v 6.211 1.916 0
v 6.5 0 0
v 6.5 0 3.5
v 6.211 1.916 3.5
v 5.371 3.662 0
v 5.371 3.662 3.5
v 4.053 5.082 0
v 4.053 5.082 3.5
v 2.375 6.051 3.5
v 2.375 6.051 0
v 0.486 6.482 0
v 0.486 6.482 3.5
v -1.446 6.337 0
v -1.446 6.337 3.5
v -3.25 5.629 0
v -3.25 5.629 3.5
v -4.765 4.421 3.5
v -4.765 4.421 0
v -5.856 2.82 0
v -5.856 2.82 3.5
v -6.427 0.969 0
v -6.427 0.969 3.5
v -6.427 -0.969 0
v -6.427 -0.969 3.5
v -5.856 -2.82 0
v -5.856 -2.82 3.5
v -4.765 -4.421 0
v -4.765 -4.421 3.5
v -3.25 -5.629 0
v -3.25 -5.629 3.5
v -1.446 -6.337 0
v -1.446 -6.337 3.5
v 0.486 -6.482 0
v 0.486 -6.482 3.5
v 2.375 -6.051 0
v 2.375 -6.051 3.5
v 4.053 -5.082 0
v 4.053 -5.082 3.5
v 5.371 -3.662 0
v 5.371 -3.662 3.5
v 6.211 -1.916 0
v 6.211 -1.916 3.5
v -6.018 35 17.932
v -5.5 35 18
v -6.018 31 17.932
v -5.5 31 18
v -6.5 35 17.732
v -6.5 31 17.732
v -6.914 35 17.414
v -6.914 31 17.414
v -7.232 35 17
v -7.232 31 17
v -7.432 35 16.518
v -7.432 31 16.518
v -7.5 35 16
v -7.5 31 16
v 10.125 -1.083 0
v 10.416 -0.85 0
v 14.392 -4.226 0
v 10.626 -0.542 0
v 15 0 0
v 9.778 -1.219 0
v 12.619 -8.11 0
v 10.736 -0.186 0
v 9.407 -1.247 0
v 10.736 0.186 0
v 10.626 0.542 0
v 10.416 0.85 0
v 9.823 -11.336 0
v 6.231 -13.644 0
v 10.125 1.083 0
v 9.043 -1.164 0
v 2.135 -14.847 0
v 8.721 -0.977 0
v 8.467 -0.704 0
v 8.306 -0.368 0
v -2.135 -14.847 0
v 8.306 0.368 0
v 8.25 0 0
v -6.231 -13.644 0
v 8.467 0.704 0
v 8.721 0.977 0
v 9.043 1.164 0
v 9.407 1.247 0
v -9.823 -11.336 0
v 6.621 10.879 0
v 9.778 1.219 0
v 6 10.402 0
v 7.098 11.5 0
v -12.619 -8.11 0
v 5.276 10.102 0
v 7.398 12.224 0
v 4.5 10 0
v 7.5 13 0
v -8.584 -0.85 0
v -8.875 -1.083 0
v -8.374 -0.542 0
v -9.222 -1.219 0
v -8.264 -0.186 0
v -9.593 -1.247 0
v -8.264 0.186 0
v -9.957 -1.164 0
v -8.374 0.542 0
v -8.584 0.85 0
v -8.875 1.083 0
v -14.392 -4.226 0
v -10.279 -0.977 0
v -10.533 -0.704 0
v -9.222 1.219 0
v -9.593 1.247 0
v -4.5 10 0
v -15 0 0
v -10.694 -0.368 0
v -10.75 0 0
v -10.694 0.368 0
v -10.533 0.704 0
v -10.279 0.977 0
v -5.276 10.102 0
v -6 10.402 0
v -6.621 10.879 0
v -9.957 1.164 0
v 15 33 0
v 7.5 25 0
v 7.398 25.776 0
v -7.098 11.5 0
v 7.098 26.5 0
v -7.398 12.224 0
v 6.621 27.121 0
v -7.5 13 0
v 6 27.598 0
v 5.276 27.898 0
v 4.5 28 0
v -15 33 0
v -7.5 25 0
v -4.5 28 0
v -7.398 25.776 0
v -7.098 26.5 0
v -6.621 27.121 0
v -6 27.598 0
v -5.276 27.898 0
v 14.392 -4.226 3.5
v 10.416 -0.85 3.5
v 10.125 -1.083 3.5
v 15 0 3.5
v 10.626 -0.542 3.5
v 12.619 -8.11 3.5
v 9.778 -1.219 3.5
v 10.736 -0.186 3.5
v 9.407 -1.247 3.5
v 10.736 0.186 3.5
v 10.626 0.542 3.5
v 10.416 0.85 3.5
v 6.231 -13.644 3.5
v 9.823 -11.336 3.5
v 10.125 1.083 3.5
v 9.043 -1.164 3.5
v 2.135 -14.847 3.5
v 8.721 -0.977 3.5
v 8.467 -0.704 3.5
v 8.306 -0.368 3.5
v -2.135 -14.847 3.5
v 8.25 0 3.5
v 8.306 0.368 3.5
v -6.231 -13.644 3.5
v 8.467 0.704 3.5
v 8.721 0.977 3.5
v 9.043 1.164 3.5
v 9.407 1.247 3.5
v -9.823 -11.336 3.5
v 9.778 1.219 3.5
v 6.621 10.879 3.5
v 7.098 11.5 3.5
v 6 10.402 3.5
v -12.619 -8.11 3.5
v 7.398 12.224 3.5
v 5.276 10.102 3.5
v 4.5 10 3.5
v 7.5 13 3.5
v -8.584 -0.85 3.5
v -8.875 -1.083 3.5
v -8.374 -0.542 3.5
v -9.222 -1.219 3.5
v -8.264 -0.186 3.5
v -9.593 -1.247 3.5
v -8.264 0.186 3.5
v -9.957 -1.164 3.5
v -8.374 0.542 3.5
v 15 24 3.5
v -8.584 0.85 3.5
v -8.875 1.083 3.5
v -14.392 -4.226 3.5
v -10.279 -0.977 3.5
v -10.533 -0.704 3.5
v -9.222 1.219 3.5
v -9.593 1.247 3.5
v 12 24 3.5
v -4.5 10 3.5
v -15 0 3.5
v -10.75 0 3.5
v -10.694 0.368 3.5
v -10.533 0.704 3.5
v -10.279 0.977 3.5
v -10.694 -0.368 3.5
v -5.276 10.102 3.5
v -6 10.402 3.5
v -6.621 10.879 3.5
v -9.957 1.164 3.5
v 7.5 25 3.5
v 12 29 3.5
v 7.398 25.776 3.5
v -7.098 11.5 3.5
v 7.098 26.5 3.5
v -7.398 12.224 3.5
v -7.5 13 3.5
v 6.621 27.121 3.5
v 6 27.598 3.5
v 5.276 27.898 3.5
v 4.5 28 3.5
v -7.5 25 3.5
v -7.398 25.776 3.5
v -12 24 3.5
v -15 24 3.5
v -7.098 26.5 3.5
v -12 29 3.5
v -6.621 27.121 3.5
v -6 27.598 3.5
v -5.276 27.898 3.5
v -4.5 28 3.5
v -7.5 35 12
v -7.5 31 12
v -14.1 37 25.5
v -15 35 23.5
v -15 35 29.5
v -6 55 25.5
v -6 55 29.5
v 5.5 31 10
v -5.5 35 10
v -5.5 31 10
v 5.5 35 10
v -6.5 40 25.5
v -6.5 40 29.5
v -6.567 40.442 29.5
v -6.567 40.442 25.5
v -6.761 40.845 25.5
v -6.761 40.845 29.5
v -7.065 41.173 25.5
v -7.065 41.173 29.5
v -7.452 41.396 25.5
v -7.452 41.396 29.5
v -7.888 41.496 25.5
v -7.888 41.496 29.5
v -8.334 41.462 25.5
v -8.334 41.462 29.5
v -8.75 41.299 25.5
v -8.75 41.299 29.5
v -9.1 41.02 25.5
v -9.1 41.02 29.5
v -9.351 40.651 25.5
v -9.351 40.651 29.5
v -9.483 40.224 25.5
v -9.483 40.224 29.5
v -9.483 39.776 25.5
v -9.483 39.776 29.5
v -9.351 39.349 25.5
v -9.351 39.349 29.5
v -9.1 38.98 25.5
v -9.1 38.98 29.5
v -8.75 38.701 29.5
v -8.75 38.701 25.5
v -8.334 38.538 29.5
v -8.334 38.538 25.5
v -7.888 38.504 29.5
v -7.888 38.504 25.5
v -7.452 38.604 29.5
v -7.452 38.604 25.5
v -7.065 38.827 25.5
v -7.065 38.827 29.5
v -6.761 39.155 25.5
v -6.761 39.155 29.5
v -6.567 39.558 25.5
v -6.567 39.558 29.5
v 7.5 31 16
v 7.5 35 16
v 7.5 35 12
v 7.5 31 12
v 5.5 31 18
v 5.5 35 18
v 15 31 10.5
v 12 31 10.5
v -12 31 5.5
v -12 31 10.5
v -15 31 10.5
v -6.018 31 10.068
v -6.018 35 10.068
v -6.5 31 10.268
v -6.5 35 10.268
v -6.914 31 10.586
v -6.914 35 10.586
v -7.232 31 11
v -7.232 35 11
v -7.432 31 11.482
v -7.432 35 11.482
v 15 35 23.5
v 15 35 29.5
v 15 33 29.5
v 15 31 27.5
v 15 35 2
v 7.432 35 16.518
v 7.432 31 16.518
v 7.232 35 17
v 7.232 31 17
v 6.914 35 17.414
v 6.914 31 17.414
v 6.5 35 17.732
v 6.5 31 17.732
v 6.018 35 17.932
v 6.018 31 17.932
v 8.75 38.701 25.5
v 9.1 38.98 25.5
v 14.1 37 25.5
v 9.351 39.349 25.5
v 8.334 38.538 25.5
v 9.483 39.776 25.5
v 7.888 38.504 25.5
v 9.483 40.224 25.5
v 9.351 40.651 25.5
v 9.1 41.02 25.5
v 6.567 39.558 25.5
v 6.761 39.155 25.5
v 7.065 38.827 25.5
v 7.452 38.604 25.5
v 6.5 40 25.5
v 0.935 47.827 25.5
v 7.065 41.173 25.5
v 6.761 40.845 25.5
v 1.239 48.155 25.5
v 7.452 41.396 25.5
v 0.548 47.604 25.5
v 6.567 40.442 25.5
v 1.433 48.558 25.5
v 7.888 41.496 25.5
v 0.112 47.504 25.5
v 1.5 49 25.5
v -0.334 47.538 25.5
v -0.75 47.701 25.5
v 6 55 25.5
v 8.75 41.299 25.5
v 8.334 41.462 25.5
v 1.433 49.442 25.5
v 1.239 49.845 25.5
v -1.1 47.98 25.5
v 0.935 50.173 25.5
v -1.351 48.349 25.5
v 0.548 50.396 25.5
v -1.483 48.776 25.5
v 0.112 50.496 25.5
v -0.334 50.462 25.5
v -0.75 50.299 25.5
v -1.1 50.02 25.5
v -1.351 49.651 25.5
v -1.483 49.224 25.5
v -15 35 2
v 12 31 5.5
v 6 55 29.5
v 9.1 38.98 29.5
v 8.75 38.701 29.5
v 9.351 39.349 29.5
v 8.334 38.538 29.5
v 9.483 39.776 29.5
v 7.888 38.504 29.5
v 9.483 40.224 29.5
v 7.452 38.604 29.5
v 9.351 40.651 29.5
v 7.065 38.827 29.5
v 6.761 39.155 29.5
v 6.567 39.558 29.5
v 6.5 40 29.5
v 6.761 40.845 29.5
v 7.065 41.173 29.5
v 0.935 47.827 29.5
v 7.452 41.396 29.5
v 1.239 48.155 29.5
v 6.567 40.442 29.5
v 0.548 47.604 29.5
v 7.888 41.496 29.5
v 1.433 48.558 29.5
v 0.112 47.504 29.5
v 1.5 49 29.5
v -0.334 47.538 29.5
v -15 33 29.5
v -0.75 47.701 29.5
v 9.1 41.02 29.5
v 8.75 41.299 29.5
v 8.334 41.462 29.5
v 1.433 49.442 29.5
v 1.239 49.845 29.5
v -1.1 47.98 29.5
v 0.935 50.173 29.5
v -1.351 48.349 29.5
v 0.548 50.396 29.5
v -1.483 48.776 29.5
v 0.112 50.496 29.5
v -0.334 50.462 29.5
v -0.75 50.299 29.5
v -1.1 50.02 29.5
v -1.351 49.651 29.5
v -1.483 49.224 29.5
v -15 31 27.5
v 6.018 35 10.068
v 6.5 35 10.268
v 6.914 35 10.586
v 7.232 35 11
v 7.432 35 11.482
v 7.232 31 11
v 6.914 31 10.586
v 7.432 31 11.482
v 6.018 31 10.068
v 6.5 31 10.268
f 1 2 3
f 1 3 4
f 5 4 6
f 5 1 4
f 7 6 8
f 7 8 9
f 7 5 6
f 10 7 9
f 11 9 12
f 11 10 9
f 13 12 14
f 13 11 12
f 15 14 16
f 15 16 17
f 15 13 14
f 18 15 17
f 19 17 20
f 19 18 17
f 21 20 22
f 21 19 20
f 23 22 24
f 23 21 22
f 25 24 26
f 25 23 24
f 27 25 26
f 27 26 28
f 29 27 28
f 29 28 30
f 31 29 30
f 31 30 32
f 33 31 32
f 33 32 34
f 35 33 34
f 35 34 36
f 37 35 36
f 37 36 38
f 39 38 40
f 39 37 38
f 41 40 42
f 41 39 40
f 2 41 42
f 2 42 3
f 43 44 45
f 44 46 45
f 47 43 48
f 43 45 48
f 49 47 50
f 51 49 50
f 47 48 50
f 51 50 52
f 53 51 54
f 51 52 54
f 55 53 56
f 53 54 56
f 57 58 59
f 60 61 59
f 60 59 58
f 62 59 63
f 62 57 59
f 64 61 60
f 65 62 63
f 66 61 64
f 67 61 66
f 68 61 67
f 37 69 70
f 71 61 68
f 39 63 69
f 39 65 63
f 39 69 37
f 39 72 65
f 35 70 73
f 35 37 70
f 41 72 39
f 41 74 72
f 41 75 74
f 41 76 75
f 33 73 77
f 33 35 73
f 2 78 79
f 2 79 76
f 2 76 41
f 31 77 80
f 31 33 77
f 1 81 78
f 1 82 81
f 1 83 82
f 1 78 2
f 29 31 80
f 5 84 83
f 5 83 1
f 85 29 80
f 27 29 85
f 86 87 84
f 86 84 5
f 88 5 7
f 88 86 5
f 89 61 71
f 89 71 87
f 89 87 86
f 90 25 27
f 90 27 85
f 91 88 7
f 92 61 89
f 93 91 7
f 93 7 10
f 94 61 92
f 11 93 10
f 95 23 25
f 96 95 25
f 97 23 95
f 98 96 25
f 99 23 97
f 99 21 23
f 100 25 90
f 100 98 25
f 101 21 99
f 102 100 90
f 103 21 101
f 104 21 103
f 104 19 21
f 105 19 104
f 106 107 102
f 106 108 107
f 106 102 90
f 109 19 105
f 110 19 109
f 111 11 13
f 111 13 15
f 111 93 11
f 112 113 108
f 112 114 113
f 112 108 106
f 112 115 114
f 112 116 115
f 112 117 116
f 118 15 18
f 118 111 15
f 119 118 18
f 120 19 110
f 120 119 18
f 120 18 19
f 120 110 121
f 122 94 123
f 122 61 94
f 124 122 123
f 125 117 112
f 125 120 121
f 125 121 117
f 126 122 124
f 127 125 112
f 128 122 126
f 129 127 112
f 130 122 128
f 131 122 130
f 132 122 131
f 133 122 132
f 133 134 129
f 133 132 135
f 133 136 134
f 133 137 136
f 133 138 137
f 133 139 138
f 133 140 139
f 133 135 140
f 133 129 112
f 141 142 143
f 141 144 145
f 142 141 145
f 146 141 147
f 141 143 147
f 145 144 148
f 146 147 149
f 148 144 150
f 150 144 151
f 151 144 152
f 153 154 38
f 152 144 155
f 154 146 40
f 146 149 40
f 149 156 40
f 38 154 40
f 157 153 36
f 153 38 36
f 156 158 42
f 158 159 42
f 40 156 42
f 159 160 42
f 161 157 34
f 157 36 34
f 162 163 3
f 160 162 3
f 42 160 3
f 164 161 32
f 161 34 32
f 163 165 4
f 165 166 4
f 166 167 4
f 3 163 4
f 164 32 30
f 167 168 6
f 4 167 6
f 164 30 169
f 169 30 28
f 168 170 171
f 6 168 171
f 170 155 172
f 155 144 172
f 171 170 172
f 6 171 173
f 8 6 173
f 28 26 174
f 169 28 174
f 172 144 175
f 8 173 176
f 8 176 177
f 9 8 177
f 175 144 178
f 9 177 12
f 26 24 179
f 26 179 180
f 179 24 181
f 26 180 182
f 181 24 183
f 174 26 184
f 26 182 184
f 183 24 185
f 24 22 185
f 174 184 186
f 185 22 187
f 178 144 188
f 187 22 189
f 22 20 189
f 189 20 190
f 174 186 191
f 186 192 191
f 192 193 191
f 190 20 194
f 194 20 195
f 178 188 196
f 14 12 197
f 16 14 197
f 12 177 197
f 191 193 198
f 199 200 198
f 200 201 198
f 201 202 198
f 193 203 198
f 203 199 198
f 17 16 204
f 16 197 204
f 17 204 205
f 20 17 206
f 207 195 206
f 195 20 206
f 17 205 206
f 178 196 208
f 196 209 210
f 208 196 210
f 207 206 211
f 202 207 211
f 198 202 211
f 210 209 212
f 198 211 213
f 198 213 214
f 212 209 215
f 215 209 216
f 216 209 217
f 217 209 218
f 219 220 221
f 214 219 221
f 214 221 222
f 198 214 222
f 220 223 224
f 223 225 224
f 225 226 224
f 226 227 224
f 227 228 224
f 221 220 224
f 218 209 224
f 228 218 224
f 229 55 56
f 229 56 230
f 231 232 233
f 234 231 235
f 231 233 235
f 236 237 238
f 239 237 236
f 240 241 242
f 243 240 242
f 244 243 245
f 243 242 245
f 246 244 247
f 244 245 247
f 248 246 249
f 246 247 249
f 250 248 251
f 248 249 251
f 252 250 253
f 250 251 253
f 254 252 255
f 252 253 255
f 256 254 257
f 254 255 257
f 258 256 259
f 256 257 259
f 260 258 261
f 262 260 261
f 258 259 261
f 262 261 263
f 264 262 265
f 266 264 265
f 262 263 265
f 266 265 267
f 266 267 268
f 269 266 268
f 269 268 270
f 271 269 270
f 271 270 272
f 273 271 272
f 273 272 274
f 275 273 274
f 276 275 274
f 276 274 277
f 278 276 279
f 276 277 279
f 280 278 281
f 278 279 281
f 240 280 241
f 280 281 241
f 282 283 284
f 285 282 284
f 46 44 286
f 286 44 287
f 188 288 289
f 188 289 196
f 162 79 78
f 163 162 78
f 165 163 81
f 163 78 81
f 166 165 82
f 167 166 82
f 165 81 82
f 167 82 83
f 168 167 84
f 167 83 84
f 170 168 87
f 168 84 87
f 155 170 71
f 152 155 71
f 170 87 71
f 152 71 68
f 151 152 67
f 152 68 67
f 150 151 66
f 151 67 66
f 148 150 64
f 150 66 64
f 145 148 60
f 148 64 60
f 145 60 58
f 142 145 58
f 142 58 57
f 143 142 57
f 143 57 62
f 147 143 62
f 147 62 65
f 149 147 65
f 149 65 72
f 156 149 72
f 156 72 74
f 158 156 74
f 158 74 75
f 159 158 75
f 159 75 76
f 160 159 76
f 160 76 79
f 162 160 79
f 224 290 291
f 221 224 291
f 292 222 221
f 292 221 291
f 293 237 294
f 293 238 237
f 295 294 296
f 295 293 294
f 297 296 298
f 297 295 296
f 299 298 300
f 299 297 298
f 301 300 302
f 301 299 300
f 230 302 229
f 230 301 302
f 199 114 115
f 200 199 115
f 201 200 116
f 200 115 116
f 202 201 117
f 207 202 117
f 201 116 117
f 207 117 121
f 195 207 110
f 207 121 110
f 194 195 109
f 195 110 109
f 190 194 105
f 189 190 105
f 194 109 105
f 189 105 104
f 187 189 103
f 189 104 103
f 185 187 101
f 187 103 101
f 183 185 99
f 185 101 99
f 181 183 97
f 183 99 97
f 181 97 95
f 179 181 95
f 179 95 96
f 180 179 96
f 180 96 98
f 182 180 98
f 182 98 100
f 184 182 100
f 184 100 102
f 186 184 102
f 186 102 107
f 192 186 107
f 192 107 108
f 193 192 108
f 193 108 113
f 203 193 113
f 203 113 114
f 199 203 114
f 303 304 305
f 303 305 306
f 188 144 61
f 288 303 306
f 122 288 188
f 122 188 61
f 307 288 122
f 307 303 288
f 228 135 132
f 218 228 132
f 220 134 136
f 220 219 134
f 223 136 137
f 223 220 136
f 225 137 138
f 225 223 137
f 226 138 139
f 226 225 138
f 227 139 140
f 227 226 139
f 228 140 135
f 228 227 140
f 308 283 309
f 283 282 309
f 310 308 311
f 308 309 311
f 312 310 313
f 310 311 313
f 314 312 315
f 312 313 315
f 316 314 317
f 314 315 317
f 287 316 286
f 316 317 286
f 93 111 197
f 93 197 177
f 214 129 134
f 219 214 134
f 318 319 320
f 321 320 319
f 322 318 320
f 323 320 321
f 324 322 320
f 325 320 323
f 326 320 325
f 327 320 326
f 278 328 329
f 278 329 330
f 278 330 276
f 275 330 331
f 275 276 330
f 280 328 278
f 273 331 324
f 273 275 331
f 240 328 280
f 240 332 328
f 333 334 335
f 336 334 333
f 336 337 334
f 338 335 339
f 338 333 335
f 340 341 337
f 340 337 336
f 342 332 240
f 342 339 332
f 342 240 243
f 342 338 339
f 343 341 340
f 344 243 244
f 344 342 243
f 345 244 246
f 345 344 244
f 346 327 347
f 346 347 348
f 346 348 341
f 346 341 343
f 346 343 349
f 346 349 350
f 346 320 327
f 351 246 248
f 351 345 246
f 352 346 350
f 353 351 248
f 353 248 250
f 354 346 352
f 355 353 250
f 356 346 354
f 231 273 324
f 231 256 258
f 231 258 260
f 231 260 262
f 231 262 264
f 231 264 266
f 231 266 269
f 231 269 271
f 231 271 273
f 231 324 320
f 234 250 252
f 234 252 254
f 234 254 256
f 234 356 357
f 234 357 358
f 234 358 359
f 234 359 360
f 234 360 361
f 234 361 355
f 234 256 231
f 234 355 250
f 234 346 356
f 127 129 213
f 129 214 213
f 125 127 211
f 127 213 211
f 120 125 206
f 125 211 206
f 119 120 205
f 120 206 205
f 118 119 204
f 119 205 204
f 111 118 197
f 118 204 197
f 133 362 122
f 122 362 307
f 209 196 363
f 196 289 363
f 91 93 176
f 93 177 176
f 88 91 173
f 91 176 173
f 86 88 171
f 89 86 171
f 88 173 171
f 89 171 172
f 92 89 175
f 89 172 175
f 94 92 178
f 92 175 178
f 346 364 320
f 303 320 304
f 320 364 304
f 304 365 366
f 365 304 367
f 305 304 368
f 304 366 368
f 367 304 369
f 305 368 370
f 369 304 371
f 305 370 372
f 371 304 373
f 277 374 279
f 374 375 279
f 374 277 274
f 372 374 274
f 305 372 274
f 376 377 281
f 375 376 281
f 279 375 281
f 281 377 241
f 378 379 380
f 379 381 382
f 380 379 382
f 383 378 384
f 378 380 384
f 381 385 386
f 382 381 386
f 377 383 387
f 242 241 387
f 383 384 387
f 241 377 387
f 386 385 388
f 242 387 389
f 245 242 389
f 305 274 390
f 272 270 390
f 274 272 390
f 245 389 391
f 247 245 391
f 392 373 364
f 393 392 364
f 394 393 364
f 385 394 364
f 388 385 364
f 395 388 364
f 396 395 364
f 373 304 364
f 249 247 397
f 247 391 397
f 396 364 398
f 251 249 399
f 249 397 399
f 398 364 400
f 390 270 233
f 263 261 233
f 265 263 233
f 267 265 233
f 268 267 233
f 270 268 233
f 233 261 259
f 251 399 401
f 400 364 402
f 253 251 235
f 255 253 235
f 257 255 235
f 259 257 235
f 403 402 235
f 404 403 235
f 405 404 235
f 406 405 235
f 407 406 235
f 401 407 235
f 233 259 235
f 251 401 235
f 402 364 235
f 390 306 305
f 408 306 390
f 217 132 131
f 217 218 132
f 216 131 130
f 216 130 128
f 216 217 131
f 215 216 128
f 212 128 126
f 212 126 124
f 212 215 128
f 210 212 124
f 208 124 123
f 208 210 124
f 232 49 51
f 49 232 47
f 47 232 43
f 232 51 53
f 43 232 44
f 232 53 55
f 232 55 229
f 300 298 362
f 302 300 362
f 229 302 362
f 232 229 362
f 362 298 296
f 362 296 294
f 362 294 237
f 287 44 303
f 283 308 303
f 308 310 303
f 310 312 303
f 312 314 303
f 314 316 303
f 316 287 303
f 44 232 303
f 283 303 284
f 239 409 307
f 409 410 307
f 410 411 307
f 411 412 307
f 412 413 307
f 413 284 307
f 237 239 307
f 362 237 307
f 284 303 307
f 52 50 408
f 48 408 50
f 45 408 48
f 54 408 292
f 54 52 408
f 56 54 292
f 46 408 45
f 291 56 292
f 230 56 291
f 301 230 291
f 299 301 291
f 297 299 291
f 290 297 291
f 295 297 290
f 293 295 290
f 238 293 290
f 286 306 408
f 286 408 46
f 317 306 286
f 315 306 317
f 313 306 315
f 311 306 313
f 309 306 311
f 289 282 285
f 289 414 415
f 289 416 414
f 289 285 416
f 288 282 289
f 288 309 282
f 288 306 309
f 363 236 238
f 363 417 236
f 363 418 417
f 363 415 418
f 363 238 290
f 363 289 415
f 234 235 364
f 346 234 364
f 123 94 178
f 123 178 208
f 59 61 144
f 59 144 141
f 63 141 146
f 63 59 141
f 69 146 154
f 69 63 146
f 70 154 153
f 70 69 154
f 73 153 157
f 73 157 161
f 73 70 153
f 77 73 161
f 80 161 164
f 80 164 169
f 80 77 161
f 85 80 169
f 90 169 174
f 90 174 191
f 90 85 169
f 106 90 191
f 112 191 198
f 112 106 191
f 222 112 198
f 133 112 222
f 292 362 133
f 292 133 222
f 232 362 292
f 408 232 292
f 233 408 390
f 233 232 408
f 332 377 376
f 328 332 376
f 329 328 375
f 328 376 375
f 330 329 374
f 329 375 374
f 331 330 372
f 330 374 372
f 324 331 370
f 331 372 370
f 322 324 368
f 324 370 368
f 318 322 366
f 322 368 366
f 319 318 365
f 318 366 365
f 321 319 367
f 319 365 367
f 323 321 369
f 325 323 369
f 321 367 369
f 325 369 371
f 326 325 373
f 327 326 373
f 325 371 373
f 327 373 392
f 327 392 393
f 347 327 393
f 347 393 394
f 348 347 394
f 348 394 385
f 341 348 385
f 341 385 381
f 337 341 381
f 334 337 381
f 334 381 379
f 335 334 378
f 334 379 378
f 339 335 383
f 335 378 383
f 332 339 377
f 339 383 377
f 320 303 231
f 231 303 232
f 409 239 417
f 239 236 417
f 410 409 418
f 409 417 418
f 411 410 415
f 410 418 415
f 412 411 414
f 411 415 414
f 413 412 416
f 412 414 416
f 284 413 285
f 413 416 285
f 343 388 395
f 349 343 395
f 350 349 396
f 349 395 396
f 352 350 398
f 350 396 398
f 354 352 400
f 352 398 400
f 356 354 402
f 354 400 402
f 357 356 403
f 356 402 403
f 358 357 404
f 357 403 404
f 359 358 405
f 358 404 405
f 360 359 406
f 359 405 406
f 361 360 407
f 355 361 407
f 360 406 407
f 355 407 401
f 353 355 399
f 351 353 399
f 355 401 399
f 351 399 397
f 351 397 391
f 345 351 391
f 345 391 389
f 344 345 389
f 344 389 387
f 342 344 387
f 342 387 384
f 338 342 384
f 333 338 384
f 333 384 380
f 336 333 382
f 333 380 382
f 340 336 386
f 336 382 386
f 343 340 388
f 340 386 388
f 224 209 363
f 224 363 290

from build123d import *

# Parameters (mm, degrees)
SKETCH_1_R          = 6.5
SKETCH_1_W          = 15
SKETCH_1_H          = 18
EXTRUDE_1_DEPTH     = 3.5
HOLE_WIZARD_M3_1_D  = 2.5
FILLET_1_R          = 3
SKETCH_2_W          = 26
SKETCH_2_H          = 4
EXTRUDE_2_DEPTH     = 30
SKETCH_4_R          = 1.5
EXTRUDE_3_DEPTH     = 4
CHAMFER_1_SIZE      = 2
SKETCH_5_W          = 15
SKETCH_5_H          = 8
CUT_EXTRUDE_1_DEPTH = 10
FILLET_2_R          = 2
EXTRUDE_4_DEPTH     = 3
EXTRUDE_5_DEPTH     = 3


with BuildPart() as part:
    # 草图1 → 凸台-拉伸1 (new body)
    with BuildSketch(Plane.XY):
        with BuildLine():
            Line((-15, 35), (15, 35))
            Line((15, 35), (15, 0))
            ThreePointArc((15, 0), (0, -15), (-15, 0))
            Line((-15, 0), (-15, 35))
        make_face()
        Circle(SKETCH_1_R, mode=Mode.SUBTRACT)
        with Locations((0, 19)):
            Rectangle(SKETCH_1_W, SKETCH_1_H, mode=Mode.SUBTRACT)
    extrude(amount=EXTRUDE_1_DEPTH)

    # M3 螺纹孔1 (through all)
    with Locations(Plane.XY.offset(3.5)):
        with Locations((9.5, 0), (-9.5, 0)):
            Hole(HOLE_WIZARD_M3_1_D / 2)

    # 圆角1
    fillet_1_edges = [part.edges().sort_by_distance(p)[0] for p in [
        (-7.5, 10, 1.75),
        (7.5, 10, 1.75),
        (7.5, 28, 1.75),
        (-7.5, 28, 1.75),
    ]]
    fillet(fillet_1_edges, radius=FILLET_1_R)

    # 草图2 → 凸台-拉伸2 (add, through all)
    with BuildSketch(Plane(origin=(15, 0, 0), x_dir=(0, 0, -1), z_dir=(1, 0, 0))):
        with Locations((-16.5, 33)):
            Rectangle(SKETCH_2_W, SKETCH_2_H)
    extrude(amount=-EXTRUDE_2_DEPTH)

    # 草图4 → 凸台-拉伸3 (add)
    with BuildSketch(Plane.XY.offset(29.5)):
        Polygon((-15, 35), (-6, 55), (6, 55), (15, 35), align=None)
        with Locations((0, 49)):
            Circle(SKETCH_4_R, mode=Mode.SUBTRACT)
        with Locations((-8, 40)):
            Circle(SKETCH_4_R, mode=Mode.SUBTRACT)
        with Locations(Location((8, 40, 0), (0, 0, 180))):
            Circle(SKETCH_4_R, mode=Mode.SUBTRACT)
    extrude(amount=-EXTRUDE_3_DEPTH)

    # 倒角1
    chamfer_1_edges = [part.edges().sort_by_distance(p)[0] for p in [
        (0, 35, 0),
        (0, 31, 3.5),
        (0, 31, 29.5),
        (0, 35, 25.5),
    ]]
    chamfer(chamfer_1_edges, length=CHAMFER_1_SIZE)

    # 草图5 → 切除-拉伸1 (cut)
    with BuildSketch(Plane(origin=(0, 35, 0), x_dir=(1, 0, 0), z_dir=(0, 1, 0))):
        with Locations((0, -14)):
            Rectangle(SKETCH_5_W, SKETCH_5_H)
    extrude(amount=-CUT_EXTRUDE_1_DEPTH, mode=Mode.SUBTRACT)

    # 圆角2
    fillet_2_edges = [part.edges().sort_by_distance(p)[0] for p in [
        (-7.5, 33, 18),
        (-7.5, 33, 10),
        (7.5, 33, 10),
        (7.5, 33, 18),
    ]]
    fillet(fillet_2_edges, radius=FILLET_2_R)

    # 草图6 → 凸台-拉伸4 (add)
    with BuildSketch(Plane.ZY.offset(15)):
        Polygon((3.5, 24), (10.5, 31), (5.5, 31), (3.5, 29), align=None)
    extrude(amount=-EXTRUDE_4_DEPTH)

    # 草图7 → 凸台-拉伸5 (add)
    with BuildSketch(Plane(origin=(15, 0, 0), x_dir=(0, 0, -1), z_dir=(1, 0, 0))):
        Polygon((-3.5, 24), (-3.5, 29), (-5.5, 31), (-10.5, 31), align=None)
    extrude(amount=-EXTRUDE_5_DEPTH)


solid = part.part
